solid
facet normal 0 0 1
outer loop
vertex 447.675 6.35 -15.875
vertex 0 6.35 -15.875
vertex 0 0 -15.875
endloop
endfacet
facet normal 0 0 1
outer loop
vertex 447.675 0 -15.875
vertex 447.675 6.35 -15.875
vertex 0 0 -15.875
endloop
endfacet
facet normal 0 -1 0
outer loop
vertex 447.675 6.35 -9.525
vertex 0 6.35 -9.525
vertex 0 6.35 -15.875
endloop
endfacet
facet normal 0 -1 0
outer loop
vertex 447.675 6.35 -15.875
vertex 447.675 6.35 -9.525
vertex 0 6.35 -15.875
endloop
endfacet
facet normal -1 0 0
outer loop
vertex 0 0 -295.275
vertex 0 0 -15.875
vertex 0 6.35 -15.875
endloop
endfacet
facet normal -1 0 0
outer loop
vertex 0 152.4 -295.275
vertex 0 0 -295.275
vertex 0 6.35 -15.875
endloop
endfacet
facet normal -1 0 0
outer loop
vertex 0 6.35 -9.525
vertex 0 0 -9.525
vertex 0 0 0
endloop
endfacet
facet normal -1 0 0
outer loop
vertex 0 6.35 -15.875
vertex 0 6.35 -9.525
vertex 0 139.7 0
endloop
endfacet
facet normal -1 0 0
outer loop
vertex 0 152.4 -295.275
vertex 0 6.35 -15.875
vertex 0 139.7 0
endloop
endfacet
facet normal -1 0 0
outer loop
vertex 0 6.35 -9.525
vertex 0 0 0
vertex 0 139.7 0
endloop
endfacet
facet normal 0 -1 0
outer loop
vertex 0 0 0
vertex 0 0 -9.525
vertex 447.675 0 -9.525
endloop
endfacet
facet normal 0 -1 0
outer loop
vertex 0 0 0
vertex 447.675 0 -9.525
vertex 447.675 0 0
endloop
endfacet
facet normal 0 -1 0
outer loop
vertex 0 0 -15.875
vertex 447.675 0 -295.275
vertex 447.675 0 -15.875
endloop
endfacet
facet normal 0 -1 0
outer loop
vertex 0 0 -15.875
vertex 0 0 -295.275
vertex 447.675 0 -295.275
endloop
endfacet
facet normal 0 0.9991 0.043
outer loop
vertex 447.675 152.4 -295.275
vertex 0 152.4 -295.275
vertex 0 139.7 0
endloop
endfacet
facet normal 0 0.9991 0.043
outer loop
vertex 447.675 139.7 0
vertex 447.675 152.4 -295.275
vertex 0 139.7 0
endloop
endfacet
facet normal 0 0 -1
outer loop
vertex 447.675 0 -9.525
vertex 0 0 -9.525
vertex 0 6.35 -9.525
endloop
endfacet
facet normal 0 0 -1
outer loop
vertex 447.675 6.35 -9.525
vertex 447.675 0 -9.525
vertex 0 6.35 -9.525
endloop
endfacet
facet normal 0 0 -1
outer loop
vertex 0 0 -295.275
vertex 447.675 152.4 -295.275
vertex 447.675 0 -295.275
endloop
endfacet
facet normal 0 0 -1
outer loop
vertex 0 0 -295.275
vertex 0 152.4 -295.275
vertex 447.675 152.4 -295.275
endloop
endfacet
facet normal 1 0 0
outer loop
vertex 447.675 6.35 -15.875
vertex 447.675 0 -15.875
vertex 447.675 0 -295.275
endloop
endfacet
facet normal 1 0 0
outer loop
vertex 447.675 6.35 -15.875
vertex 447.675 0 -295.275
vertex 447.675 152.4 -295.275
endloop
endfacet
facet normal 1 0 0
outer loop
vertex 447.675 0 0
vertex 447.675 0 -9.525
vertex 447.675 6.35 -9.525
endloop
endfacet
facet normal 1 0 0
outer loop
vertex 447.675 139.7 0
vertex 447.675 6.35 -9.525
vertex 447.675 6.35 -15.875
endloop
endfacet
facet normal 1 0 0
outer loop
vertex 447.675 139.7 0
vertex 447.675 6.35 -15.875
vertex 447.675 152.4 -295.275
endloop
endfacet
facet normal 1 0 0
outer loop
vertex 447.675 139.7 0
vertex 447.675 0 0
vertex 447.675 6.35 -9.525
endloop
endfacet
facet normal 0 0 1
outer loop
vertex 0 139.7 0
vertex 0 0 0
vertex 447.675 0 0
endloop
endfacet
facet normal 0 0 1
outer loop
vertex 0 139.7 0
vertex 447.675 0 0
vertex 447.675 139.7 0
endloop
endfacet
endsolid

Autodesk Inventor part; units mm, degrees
ref_plane "YZ Plane" through (0, 0, 0) normal (1, 0, 0) x (0, 1, 0)
ref_plane "XZ Plane" through (0, 0, 0) normal (0, 1, 0) x (-1, 0, 0)
ref_plane "XY Plane" through (0, 0, 0) normal (0, 0, 1) x (1, 0, 0)
sketch "Sketch2" plane through (0, 0, 0) normal (1, 0, 0) x (0, 1, 0)
  line L0 (0, 0) -> (152.4, 0)
  line L1 (152.4, 0) -> (152.4, -295.275)
  line L2 (152.4, -295.275) -> (0, -295.275)
  line L3 (0, -295.275) -> (0, 0)
  line L4 (152.4, -295.275) -> (139.7, 0)
  line L5 (0, -9.525) -> (6.35, -9.525)
  line L6 (6.35, -9.525) -> (6.35, -15.875)
  line L7 (6.35, -15.875) -> (0, -15.875)
  line L8 (0, -15.875) -> (0, -9.525)
  point P0 (0, -15.875)
  dimension "d4" = 152.4
  dimension "d5" = 295.275
  dimension "d6" = 12.7
  dimension "d7" = 6.35
  dimension "d8" = 6.35
  dimension "d9" = 9.525
extrude "Extrusion2" add sketch "Sketch2" along normal blind 447.675 contours L0 L4 L2 L3 L7 L6 L5
